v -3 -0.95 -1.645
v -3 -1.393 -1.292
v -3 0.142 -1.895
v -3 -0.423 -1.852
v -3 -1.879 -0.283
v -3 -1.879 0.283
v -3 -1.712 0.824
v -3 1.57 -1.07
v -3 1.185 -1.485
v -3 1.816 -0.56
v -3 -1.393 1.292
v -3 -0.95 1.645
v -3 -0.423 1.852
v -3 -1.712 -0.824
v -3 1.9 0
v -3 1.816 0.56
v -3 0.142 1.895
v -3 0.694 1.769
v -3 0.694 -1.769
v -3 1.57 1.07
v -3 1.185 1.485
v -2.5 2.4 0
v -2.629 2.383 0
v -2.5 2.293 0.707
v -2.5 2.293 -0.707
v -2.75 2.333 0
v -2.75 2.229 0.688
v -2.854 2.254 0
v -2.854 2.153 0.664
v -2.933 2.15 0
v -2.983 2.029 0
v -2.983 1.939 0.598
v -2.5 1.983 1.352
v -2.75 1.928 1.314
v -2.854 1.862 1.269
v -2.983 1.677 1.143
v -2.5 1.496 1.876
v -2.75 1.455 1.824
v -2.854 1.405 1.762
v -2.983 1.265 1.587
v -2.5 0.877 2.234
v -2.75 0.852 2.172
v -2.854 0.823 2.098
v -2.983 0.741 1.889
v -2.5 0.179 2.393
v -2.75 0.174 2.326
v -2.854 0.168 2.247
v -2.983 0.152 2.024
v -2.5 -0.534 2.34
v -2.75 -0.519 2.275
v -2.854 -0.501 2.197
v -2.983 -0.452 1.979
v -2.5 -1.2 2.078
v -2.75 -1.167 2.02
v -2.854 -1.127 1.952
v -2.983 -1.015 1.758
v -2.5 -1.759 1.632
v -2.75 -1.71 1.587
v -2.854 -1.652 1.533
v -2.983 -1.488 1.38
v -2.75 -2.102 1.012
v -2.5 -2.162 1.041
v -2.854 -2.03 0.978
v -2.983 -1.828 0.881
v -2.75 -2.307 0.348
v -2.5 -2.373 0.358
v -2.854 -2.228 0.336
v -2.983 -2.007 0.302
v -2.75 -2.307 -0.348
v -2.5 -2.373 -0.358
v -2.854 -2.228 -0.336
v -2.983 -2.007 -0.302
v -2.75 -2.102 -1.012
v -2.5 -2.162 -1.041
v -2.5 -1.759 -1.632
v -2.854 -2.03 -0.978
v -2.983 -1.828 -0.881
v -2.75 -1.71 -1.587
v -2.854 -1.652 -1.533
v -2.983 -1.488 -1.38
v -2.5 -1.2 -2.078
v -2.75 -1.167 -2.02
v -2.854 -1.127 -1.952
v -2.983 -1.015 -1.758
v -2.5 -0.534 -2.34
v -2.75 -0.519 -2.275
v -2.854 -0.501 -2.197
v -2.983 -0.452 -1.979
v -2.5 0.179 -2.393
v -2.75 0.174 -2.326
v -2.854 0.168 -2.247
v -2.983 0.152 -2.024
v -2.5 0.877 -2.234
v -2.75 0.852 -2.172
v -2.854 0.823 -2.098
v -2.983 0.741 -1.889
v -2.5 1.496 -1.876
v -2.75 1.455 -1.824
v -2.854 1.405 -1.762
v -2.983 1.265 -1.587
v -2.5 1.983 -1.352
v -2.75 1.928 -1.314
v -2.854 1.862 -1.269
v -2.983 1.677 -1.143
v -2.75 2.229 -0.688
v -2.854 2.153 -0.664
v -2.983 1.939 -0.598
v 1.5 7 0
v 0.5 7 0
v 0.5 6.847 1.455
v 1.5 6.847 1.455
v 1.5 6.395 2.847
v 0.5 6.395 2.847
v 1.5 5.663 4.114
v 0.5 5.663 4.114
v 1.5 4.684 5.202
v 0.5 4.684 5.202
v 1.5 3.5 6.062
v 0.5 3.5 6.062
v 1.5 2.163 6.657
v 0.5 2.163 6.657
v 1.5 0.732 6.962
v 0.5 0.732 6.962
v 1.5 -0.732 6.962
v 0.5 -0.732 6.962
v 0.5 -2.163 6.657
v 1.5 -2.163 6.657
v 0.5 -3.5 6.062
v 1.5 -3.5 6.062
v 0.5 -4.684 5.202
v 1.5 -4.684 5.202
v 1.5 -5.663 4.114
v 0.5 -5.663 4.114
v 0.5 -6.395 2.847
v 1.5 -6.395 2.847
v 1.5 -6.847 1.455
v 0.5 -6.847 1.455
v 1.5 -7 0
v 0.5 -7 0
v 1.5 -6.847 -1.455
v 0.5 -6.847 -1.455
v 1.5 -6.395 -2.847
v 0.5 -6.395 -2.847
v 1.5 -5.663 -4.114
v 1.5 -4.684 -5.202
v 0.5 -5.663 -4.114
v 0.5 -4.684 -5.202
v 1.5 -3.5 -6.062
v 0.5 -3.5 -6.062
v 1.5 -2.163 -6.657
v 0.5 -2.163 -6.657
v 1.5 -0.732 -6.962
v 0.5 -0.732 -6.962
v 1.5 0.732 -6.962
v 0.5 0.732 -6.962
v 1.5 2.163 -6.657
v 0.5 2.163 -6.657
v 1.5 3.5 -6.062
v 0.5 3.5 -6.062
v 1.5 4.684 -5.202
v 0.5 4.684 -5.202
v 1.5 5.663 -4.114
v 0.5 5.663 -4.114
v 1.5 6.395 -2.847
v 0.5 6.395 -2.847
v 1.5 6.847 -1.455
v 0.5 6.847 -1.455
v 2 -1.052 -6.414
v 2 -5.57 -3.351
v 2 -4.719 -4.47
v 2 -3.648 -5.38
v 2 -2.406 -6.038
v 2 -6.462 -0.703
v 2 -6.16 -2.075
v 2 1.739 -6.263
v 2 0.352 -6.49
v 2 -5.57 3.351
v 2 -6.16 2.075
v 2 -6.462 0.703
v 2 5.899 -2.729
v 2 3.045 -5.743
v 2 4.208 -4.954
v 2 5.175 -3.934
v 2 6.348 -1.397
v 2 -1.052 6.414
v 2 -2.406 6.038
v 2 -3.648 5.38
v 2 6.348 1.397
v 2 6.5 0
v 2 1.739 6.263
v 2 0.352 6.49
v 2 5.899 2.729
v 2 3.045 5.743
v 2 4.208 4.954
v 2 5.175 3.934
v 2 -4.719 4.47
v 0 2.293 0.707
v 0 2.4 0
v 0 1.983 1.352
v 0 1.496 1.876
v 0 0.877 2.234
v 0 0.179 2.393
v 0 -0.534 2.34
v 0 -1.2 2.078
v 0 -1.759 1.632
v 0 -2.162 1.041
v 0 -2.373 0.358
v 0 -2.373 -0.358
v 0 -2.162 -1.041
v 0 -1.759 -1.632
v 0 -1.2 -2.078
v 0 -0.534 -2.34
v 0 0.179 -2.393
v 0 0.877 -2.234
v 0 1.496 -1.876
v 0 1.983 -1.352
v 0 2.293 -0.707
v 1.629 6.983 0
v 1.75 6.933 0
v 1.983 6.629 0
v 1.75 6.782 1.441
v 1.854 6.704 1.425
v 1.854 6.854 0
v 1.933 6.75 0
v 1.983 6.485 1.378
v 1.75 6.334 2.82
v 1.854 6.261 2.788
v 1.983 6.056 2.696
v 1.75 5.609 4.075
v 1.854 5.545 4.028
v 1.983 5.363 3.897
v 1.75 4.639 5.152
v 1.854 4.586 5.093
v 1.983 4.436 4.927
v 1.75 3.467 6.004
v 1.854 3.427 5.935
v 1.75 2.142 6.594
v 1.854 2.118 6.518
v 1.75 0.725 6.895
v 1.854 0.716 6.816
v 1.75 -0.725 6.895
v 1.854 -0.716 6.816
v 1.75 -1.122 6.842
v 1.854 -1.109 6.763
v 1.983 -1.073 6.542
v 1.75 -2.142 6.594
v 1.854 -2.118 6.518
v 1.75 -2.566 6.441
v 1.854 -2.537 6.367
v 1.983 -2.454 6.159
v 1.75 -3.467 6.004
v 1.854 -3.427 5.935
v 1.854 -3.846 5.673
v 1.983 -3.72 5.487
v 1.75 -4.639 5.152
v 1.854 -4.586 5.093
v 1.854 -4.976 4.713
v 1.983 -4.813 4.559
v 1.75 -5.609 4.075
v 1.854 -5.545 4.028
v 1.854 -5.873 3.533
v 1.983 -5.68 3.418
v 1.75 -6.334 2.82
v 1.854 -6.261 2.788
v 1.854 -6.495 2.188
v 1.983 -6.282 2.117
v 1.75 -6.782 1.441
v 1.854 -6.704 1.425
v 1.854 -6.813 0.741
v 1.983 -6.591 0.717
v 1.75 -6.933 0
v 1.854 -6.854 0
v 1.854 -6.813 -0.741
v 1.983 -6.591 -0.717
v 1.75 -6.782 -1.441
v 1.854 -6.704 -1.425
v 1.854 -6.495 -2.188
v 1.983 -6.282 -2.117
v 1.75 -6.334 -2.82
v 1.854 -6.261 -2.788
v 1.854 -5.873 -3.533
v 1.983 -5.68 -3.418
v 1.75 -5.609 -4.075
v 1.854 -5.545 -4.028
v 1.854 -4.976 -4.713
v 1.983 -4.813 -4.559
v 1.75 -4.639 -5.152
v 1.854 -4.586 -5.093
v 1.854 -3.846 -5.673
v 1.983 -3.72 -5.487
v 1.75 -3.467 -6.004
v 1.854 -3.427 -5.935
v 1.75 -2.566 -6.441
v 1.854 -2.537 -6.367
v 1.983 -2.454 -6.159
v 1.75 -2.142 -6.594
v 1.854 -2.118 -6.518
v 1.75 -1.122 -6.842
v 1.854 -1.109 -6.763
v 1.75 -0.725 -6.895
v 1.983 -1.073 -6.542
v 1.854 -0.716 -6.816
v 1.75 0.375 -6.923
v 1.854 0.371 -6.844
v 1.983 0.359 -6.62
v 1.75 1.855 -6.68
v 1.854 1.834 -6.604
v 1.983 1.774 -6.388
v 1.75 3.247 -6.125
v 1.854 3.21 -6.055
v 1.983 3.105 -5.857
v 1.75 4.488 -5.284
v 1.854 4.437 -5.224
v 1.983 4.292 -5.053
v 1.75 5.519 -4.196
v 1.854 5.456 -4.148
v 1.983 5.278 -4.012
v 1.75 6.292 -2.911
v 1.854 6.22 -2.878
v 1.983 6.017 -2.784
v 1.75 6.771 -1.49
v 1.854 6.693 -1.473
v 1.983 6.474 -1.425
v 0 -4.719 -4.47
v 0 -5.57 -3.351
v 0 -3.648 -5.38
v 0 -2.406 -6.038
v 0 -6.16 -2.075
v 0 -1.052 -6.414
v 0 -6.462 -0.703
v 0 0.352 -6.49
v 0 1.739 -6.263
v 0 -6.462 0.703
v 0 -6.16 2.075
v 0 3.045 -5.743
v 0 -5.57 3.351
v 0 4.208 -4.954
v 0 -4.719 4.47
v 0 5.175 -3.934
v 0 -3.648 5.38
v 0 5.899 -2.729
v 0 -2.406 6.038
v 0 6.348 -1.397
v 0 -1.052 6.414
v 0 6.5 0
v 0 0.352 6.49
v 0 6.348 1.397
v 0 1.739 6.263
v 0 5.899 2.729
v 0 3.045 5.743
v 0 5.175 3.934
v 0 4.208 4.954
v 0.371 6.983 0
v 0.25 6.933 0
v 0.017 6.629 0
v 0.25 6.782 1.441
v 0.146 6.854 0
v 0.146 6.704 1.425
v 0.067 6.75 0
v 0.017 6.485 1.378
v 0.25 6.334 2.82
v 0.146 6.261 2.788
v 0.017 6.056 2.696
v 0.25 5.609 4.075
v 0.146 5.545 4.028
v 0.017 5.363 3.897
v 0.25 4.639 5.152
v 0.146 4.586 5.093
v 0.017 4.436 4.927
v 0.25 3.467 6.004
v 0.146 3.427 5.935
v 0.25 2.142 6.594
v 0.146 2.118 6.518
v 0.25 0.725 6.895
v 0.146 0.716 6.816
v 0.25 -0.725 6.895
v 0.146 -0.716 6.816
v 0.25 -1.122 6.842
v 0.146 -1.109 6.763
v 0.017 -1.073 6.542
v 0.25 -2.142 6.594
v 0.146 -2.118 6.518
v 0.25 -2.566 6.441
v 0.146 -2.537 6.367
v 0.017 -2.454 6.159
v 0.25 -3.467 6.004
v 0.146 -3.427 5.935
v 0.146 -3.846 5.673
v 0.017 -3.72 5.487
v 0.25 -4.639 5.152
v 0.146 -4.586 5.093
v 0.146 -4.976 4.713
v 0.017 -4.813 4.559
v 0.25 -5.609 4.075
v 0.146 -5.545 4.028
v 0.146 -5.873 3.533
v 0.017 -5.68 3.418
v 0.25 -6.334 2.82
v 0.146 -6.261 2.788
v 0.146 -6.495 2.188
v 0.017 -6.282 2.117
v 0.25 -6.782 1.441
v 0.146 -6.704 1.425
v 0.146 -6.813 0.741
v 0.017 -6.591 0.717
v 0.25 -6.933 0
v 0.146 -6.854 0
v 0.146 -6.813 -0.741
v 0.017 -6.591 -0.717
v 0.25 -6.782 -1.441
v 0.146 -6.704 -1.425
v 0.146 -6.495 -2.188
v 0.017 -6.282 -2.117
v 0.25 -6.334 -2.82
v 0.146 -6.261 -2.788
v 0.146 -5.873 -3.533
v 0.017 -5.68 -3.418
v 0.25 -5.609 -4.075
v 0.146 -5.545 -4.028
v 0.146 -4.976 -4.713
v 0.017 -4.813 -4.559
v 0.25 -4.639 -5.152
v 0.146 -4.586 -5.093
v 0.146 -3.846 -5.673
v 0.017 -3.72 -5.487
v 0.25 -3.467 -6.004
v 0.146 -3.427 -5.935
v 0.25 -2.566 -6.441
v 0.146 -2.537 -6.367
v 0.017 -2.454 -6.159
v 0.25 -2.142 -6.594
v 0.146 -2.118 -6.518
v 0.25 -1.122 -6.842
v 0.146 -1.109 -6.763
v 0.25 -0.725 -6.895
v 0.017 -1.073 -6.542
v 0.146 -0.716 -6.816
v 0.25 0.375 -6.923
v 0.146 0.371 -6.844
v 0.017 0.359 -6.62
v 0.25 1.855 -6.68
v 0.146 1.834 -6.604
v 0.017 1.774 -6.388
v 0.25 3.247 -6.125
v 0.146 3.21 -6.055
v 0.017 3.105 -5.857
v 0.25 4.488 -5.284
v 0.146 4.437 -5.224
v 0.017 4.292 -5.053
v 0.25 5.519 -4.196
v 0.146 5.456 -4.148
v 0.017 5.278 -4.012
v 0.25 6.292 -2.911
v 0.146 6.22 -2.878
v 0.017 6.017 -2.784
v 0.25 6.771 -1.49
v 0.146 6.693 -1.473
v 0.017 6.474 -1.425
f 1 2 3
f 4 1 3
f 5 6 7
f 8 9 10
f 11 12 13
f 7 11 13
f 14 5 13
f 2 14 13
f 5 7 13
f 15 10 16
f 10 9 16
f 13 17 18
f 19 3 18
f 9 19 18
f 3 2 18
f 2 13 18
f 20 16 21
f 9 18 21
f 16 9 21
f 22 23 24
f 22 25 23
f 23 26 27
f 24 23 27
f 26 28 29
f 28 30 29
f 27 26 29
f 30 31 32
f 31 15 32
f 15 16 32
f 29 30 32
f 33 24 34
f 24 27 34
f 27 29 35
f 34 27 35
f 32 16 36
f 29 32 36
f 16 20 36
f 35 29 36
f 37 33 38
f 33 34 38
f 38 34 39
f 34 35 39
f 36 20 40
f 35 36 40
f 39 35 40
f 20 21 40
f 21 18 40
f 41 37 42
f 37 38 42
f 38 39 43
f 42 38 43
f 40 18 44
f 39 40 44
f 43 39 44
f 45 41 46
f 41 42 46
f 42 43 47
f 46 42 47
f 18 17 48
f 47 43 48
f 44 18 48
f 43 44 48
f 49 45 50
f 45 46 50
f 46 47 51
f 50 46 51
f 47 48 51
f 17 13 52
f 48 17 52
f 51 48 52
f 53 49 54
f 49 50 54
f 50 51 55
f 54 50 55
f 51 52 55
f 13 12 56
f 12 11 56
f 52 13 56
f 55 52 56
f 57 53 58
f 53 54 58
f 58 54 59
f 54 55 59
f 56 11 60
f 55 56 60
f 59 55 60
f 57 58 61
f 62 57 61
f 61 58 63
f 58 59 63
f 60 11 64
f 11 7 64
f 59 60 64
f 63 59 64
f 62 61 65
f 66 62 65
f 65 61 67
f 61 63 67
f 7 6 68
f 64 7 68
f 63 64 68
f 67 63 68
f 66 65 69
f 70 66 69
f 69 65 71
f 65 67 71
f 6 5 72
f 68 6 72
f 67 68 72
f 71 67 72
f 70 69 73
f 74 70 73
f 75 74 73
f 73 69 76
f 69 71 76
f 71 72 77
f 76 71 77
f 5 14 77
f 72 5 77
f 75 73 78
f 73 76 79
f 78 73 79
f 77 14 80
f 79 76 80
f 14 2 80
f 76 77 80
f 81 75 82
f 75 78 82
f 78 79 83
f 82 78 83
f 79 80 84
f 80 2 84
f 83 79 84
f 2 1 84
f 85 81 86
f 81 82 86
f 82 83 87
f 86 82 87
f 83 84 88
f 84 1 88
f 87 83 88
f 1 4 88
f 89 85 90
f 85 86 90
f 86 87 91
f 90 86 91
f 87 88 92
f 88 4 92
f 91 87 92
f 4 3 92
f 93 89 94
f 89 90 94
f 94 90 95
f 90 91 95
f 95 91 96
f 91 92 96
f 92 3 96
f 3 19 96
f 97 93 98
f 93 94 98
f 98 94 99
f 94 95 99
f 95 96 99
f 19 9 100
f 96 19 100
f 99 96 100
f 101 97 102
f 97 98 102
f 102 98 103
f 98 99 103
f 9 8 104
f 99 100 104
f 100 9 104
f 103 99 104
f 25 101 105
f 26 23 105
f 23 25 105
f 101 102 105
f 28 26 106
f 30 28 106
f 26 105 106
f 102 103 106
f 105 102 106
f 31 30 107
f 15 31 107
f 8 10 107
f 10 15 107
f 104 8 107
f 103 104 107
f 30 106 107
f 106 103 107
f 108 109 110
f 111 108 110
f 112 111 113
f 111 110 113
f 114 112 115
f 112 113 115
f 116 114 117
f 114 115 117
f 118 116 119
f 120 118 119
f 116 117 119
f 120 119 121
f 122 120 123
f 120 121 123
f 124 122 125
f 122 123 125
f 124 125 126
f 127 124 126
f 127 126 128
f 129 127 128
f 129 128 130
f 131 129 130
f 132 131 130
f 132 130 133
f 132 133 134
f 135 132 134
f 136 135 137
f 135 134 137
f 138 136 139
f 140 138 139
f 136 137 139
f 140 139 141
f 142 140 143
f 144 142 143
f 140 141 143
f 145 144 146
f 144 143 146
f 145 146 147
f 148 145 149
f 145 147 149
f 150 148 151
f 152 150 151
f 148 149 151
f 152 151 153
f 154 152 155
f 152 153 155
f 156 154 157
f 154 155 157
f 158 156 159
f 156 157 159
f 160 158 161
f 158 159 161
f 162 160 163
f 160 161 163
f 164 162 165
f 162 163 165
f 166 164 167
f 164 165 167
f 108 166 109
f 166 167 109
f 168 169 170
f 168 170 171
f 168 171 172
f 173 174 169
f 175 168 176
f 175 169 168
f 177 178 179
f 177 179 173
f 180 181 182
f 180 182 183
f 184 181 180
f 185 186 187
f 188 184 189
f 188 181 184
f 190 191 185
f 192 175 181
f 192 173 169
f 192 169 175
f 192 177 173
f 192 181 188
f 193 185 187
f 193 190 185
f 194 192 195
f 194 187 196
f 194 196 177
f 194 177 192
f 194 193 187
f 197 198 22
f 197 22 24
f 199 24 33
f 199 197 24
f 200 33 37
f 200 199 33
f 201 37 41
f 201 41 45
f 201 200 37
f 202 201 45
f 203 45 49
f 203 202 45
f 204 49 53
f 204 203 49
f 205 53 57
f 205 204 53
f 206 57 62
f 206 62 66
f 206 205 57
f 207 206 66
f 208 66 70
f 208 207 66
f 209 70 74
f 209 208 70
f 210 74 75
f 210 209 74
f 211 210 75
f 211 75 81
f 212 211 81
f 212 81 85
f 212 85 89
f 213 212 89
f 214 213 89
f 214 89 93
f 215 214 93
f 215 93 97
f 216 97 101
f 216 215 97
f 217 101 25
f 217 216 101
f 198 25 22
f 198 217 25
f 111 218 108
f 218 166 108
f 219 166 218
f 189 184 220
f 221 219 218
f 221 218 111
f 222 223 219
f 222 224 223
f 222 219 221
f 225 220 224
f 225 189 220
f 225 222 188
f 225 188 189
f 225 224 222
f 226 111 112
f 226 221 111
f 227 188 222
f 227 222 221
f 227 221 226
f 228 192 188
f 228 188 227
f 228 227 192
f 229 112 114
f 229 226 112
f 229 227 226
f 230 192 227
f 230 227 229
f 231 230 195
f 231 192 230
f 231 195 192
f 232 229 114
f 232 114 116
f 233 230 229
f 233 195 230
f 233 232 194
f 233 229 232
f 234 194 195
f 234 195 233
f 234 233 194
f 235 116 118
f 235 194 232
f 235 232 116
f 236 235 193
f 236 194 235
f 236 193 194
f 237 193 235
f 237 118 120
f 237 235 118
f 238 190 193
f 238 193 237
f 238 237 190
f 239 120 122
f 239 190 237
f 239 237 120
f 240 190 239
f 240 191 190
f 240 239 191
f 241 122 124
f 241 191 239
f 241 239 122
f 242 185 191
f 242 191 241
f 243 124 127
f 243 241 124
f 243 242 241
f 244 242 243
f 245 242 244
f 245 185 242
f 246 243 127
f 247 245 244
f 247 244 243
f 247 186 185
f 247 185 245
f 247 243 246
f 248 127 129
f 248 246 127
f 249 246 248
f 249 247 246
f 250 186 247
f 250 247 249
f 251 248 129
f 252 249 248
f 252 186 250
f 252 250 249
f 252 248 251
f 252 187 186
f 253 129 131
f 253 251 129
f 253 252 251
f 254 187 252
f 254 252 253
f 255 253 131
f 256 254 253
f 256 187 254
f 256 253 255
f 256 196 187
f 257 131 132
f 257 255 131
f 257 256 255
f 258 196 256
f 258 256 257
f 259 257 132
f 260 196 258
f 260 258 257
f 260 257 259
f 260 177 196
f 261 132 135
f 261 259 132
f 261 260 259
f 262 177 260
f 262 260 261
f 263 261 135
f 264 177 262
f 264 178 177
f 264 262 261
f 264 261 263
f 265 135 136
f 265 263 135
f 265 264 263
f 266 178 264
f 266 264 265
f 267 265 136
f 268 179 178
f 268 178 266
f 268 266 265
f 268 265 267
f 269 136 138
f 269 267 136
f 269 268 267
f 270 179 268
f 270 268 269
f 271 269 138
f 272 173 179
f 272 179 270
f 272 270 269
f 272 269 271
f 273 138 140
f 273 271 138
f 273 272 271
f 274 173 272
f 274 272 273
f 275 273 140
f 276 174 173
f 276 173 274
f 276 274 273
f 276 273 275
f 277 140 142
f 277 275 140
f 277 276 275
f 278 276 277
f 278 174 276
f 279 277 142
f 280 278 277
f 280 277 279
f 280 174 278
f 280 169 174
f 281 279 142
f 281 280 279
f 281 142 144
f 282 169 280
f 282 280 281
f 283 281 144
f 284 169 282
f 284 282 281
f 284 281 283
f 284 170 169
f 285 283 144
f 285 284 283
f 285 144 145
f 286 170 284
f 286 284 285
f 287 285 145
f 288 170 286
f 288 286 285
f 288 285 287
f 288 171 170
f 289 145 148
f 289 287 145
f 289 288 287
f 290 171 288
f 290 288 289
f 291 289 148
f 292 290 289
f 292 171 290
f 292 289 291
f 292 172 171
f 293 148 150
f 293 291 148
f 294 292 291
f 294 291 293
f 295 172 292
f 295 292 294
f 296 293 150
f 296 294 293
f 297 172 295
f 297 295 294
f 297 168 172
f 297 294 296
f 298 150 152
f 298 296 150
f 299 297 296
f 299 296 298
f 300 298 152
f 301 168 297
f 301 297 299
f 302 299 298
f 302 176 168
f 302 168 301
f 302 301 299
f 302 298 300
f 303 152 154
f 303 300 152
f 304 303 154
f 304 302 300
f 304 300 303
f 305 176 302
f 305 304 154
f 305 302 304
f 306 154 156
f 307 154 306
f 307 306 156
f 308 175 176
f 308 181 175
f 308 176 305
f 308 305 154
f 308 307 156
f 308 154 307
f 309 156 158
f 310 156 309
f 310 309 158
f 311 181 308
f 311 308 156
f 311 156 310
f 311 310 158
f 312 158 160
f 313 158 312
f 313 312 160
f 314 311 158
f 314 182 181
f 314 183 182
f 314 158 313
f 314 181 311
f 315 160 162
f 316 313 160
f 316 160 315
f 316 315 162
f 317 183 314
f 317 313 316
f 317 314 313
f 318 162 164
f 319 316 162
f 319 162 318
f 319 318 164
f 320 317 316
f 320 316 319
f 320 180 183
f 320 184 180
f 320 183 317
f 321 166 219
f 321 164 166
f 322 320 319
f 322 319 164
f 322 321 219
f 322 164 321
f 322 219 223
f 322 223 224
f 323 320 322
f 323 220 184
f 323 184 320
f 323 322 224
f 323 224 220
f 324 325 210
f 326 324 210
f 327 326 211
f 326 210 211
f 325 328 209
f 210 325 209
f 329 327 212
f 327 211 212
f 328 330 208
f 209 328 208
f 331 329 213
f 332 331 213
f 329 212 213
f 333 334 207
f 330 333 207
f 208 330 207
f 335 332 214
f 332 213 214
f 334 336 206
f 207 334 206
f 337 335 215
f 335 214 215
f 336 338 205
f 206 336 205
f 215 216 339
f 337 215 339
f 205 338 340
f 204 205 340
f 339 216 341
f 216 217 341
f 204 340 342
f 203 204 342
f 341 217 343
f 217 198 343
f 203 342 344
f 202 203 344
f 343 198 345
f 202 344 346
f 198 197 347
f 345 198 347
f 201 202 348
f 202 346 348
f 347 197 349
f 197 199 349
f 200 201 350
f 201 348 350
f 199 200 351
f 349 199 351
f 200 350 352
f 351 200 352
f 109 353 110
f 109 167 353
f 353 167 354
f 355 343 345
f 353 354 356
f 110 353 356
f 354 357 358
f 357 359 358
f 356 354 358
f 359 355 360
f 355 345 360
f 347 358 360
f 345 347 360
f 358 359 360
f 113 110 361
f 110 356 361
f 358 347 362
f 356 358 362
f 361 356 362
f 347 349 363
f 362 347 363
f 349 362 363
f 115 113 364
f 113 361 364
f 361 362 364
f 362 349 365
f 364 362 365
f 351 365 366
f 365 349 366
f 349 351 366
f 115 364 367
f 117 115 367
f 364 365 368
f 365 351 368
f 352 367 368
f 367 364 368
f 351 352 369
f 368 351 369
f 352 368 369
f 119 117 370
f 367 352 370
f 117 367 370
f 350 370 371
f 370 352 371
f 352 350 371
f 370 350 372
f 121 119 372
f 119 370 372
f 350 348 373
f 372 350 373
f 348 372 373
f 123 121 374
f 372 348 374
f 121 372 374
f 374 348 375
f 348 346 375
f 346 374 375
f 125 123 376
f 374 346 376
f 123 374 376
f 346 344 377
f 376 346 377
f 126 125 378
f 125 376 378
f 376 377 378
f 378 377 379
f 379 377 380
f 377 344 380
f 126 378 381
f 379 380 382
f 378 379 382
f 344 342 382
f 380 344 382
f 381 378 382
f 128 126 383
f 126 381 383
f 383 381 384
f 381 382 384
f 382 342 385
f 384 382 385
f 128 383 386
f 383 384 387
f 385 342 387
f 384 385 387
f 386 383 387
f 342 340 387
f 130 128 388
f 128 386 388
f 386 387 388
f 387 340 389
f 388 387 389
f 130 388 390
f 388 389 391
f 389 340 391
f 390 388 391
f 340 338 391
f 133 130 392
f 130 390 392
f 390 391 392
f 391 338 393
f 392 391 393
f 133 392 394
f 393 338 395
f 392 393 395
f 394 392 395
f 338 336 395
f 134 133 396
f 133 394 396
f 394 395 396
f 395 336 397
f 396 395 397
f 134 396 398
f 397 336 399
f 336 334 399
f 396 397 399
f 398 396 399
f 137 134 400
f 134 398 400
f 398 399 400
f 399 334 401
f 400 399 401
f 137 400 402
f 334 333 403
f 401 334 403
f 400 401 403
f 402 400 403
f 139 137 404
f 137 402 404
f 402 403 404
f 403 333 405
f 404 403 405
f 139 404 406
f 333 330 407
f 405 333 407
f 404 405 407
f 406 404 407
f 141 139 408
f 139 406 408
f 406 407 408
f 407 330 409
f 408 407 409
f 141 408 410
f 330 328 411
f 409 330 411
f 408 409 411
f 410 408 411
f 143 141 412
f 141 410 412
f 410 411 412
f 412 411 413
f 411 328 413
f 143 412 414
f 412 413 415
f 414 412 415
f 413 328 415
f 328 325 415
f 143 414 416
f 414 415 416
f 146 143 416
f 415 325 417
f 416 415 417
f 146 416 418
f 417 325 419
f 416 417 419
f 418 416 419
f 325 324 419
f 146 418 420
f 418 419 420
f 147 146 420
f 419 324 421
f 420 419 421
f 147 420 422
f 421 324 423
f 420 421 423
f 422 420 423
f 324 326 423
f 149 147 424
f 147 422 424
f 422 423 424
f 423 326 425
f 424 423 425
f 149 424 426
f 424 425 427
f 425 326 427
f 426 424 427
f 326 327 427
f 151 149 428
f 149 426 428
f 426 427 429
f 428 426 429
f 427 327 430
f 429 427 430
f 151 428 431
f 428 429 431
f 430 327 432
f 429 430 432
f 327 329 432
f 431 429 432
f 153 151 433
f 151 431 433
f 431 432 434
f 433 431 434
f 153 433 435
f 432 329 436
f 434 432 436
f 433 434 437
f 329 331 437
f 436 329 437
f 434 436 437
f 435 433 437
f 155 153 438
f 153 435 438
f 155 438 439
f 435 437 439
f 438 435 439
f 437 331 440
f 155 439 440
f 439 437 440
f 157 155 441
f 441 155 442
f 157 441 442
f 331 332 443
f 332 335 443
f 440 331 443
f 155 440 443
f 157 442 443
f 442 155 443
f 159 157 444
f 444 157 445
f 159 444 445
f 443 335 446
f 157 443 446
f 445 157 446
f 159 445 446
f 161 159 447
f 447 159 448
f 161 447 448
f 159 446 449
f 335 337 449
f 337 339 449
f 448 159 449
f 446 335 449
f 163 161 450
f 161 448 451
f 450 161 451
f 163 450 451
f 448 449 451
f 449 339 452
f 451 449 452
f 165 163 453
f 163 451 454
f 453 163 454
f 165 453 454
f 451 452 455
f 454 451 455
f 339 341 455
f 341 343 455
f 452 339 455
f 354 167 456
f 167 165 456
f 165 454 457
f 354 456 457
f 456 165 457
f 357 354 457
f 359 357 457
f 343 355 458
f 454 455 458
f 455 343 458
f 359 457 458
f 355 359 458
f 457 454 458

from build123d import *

# Parameters (mm, degrees)
F0_R     = 7
F0_R_2   = 2.4
F1_DEPTH = 2
F2_DEPTH = 3
F3_R     = 0.5


with BuildPart() as f1:
    # F0 (on Right) → F1 (new body)
    with BuildSketch(Plane.YZ):
        Circle(F0_R)
        Circle(F0_R_2, mode=Mode.SUBTRACT)
        Circle(F0_R_2)
    extrude(amount=F1_DEPTH)

    # F0 (on Right) → F2 (join)
    with BuildSketch(Plane.YZ):
        Circle(F0_R_2)
    extrude(amount=-F2_DEPTH)

    # F3
    f3_edges = [f1.edges().sort_by_distance(p)[0] for p in [
        (2, -7, 0),
        (-3, -2.4, 0),
        (0, -7, 0),
    ]]
    fillet(f3_edges, radius=F3_R)


solid = f1.part
